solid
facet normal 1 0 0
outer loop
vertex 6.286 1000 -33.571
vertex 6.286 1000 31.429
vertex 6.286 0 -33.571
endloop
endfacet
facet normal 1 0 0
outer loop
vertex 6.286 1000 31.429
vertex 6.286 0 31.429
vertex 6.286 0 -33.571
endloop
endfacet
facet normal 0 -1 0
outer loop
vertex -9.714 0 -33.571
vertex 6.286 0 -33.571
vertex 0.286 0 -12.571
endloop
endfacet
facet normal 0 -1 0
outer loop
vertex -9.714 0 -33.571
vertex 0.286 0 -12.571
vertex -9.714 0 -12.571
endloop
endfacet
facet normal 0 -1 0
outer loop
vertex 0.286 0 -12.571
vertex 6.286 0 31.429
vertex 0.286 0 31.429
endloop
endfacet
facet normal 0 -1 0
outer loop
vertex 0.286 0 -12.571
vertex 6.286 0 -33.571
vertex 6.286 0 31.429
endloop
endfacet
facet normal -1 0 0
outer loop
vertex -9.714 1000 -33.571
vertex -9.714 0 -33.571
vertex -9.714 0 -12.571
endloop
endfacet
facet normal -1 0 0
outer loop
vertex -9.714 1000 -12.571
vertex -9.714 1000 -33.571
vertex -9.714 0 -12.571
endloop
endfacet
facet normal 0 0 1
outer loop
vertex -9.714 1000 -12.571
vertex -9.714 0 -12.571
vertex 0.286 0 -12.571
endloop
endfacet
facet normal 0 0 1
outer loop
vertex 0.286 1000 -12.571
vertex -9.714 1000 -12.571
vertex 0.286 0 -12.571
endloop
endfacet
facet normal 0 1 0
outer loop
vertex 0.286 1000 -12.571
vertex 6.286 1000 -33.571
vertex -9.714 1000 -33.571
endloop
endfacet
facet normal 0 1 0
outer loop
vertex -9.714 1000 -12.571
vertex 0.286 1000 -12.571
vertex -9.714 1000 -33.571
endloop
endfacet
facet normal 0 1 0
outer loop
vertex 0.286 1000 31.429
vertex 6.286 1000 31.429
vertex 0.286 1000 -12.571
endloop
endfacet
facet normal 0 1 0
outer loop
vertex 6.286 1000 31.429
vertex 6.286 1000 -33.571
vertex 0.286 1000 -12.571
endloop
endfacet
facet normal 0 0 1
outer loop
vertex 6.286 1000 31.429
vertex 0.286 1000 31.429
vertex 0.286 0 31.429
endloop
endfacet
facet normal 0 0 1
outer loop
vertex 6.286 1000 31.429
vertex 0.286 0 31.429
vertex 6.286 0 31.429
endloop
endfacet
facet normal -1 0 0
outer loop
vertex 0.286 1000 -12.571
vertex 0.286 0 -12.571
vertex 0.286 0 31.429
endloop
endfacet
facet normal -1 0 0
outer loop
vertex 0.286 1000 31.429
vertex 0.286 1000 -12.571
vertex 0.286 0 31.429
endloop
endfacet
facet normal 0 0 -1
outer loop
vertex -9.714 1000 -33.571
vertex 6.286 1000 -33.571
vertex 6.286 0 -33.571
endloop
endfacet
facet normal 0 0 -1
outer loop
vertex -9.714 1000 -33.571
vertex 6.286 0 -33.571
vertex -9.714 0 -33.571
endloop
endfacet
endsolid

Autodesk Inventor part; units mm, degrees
ref_plane "YZ Plane" through (0, 0, 0) normal (1, 0, 0) x (0, 1, 0)
ref_plane "XZ Plane" through (0, 0, 0) normal (0, 1, 0) x (-1, 0, 0)
ref_plane "XY Plane" through (0, 0, 0) normal (0, 0, 1) x (1, 0, 0)
sketch "Sketch1" plane through (0, 0, 0) normal (0, 1, 0) x (-1, 0, 0)
  point P0 (0, 0)
sketch "Sketch2" plane through (0, 0, 0) normal (0, 1, 0) x (-1, 0, 0)
  line L0 (-0.2857, 31.4286) -> (-6.2857, 31.4286)
  line L1 (-6.2857, 31.4286) -> (-6.2857, -33.5714)
  line L2 (-6.2857, -33.5714) -> (-0.2857, -33.5714)
  line L3 (-0.2857, -33.5714) -> (-0.2857, 31.4286)
  line L4 (9.7143, -12.5714) -> (-0.2857, -12.5714)
  line L5 (-0.2857, -12.5714) -> (-0.2857, -33.5714)
  line L6 (-0.2857, -33.5714) -> (9.7143, -33.5714)
  line L7 (9.7143, -33.5714) -> (9.7143, -12.5714)
  point P0 (0, 0)
  point P1 (-0.2857, -12.5714)
  dimension "d0" = 44
  dimension "d1" = 6
  dimension "d2" = 10
  dimension "d3" = 65
extrude "Extrusion1" add sketch "Sketch2" along normal blind 1000
properties part number "UgolUkrep" material "Aluminum 6061"
